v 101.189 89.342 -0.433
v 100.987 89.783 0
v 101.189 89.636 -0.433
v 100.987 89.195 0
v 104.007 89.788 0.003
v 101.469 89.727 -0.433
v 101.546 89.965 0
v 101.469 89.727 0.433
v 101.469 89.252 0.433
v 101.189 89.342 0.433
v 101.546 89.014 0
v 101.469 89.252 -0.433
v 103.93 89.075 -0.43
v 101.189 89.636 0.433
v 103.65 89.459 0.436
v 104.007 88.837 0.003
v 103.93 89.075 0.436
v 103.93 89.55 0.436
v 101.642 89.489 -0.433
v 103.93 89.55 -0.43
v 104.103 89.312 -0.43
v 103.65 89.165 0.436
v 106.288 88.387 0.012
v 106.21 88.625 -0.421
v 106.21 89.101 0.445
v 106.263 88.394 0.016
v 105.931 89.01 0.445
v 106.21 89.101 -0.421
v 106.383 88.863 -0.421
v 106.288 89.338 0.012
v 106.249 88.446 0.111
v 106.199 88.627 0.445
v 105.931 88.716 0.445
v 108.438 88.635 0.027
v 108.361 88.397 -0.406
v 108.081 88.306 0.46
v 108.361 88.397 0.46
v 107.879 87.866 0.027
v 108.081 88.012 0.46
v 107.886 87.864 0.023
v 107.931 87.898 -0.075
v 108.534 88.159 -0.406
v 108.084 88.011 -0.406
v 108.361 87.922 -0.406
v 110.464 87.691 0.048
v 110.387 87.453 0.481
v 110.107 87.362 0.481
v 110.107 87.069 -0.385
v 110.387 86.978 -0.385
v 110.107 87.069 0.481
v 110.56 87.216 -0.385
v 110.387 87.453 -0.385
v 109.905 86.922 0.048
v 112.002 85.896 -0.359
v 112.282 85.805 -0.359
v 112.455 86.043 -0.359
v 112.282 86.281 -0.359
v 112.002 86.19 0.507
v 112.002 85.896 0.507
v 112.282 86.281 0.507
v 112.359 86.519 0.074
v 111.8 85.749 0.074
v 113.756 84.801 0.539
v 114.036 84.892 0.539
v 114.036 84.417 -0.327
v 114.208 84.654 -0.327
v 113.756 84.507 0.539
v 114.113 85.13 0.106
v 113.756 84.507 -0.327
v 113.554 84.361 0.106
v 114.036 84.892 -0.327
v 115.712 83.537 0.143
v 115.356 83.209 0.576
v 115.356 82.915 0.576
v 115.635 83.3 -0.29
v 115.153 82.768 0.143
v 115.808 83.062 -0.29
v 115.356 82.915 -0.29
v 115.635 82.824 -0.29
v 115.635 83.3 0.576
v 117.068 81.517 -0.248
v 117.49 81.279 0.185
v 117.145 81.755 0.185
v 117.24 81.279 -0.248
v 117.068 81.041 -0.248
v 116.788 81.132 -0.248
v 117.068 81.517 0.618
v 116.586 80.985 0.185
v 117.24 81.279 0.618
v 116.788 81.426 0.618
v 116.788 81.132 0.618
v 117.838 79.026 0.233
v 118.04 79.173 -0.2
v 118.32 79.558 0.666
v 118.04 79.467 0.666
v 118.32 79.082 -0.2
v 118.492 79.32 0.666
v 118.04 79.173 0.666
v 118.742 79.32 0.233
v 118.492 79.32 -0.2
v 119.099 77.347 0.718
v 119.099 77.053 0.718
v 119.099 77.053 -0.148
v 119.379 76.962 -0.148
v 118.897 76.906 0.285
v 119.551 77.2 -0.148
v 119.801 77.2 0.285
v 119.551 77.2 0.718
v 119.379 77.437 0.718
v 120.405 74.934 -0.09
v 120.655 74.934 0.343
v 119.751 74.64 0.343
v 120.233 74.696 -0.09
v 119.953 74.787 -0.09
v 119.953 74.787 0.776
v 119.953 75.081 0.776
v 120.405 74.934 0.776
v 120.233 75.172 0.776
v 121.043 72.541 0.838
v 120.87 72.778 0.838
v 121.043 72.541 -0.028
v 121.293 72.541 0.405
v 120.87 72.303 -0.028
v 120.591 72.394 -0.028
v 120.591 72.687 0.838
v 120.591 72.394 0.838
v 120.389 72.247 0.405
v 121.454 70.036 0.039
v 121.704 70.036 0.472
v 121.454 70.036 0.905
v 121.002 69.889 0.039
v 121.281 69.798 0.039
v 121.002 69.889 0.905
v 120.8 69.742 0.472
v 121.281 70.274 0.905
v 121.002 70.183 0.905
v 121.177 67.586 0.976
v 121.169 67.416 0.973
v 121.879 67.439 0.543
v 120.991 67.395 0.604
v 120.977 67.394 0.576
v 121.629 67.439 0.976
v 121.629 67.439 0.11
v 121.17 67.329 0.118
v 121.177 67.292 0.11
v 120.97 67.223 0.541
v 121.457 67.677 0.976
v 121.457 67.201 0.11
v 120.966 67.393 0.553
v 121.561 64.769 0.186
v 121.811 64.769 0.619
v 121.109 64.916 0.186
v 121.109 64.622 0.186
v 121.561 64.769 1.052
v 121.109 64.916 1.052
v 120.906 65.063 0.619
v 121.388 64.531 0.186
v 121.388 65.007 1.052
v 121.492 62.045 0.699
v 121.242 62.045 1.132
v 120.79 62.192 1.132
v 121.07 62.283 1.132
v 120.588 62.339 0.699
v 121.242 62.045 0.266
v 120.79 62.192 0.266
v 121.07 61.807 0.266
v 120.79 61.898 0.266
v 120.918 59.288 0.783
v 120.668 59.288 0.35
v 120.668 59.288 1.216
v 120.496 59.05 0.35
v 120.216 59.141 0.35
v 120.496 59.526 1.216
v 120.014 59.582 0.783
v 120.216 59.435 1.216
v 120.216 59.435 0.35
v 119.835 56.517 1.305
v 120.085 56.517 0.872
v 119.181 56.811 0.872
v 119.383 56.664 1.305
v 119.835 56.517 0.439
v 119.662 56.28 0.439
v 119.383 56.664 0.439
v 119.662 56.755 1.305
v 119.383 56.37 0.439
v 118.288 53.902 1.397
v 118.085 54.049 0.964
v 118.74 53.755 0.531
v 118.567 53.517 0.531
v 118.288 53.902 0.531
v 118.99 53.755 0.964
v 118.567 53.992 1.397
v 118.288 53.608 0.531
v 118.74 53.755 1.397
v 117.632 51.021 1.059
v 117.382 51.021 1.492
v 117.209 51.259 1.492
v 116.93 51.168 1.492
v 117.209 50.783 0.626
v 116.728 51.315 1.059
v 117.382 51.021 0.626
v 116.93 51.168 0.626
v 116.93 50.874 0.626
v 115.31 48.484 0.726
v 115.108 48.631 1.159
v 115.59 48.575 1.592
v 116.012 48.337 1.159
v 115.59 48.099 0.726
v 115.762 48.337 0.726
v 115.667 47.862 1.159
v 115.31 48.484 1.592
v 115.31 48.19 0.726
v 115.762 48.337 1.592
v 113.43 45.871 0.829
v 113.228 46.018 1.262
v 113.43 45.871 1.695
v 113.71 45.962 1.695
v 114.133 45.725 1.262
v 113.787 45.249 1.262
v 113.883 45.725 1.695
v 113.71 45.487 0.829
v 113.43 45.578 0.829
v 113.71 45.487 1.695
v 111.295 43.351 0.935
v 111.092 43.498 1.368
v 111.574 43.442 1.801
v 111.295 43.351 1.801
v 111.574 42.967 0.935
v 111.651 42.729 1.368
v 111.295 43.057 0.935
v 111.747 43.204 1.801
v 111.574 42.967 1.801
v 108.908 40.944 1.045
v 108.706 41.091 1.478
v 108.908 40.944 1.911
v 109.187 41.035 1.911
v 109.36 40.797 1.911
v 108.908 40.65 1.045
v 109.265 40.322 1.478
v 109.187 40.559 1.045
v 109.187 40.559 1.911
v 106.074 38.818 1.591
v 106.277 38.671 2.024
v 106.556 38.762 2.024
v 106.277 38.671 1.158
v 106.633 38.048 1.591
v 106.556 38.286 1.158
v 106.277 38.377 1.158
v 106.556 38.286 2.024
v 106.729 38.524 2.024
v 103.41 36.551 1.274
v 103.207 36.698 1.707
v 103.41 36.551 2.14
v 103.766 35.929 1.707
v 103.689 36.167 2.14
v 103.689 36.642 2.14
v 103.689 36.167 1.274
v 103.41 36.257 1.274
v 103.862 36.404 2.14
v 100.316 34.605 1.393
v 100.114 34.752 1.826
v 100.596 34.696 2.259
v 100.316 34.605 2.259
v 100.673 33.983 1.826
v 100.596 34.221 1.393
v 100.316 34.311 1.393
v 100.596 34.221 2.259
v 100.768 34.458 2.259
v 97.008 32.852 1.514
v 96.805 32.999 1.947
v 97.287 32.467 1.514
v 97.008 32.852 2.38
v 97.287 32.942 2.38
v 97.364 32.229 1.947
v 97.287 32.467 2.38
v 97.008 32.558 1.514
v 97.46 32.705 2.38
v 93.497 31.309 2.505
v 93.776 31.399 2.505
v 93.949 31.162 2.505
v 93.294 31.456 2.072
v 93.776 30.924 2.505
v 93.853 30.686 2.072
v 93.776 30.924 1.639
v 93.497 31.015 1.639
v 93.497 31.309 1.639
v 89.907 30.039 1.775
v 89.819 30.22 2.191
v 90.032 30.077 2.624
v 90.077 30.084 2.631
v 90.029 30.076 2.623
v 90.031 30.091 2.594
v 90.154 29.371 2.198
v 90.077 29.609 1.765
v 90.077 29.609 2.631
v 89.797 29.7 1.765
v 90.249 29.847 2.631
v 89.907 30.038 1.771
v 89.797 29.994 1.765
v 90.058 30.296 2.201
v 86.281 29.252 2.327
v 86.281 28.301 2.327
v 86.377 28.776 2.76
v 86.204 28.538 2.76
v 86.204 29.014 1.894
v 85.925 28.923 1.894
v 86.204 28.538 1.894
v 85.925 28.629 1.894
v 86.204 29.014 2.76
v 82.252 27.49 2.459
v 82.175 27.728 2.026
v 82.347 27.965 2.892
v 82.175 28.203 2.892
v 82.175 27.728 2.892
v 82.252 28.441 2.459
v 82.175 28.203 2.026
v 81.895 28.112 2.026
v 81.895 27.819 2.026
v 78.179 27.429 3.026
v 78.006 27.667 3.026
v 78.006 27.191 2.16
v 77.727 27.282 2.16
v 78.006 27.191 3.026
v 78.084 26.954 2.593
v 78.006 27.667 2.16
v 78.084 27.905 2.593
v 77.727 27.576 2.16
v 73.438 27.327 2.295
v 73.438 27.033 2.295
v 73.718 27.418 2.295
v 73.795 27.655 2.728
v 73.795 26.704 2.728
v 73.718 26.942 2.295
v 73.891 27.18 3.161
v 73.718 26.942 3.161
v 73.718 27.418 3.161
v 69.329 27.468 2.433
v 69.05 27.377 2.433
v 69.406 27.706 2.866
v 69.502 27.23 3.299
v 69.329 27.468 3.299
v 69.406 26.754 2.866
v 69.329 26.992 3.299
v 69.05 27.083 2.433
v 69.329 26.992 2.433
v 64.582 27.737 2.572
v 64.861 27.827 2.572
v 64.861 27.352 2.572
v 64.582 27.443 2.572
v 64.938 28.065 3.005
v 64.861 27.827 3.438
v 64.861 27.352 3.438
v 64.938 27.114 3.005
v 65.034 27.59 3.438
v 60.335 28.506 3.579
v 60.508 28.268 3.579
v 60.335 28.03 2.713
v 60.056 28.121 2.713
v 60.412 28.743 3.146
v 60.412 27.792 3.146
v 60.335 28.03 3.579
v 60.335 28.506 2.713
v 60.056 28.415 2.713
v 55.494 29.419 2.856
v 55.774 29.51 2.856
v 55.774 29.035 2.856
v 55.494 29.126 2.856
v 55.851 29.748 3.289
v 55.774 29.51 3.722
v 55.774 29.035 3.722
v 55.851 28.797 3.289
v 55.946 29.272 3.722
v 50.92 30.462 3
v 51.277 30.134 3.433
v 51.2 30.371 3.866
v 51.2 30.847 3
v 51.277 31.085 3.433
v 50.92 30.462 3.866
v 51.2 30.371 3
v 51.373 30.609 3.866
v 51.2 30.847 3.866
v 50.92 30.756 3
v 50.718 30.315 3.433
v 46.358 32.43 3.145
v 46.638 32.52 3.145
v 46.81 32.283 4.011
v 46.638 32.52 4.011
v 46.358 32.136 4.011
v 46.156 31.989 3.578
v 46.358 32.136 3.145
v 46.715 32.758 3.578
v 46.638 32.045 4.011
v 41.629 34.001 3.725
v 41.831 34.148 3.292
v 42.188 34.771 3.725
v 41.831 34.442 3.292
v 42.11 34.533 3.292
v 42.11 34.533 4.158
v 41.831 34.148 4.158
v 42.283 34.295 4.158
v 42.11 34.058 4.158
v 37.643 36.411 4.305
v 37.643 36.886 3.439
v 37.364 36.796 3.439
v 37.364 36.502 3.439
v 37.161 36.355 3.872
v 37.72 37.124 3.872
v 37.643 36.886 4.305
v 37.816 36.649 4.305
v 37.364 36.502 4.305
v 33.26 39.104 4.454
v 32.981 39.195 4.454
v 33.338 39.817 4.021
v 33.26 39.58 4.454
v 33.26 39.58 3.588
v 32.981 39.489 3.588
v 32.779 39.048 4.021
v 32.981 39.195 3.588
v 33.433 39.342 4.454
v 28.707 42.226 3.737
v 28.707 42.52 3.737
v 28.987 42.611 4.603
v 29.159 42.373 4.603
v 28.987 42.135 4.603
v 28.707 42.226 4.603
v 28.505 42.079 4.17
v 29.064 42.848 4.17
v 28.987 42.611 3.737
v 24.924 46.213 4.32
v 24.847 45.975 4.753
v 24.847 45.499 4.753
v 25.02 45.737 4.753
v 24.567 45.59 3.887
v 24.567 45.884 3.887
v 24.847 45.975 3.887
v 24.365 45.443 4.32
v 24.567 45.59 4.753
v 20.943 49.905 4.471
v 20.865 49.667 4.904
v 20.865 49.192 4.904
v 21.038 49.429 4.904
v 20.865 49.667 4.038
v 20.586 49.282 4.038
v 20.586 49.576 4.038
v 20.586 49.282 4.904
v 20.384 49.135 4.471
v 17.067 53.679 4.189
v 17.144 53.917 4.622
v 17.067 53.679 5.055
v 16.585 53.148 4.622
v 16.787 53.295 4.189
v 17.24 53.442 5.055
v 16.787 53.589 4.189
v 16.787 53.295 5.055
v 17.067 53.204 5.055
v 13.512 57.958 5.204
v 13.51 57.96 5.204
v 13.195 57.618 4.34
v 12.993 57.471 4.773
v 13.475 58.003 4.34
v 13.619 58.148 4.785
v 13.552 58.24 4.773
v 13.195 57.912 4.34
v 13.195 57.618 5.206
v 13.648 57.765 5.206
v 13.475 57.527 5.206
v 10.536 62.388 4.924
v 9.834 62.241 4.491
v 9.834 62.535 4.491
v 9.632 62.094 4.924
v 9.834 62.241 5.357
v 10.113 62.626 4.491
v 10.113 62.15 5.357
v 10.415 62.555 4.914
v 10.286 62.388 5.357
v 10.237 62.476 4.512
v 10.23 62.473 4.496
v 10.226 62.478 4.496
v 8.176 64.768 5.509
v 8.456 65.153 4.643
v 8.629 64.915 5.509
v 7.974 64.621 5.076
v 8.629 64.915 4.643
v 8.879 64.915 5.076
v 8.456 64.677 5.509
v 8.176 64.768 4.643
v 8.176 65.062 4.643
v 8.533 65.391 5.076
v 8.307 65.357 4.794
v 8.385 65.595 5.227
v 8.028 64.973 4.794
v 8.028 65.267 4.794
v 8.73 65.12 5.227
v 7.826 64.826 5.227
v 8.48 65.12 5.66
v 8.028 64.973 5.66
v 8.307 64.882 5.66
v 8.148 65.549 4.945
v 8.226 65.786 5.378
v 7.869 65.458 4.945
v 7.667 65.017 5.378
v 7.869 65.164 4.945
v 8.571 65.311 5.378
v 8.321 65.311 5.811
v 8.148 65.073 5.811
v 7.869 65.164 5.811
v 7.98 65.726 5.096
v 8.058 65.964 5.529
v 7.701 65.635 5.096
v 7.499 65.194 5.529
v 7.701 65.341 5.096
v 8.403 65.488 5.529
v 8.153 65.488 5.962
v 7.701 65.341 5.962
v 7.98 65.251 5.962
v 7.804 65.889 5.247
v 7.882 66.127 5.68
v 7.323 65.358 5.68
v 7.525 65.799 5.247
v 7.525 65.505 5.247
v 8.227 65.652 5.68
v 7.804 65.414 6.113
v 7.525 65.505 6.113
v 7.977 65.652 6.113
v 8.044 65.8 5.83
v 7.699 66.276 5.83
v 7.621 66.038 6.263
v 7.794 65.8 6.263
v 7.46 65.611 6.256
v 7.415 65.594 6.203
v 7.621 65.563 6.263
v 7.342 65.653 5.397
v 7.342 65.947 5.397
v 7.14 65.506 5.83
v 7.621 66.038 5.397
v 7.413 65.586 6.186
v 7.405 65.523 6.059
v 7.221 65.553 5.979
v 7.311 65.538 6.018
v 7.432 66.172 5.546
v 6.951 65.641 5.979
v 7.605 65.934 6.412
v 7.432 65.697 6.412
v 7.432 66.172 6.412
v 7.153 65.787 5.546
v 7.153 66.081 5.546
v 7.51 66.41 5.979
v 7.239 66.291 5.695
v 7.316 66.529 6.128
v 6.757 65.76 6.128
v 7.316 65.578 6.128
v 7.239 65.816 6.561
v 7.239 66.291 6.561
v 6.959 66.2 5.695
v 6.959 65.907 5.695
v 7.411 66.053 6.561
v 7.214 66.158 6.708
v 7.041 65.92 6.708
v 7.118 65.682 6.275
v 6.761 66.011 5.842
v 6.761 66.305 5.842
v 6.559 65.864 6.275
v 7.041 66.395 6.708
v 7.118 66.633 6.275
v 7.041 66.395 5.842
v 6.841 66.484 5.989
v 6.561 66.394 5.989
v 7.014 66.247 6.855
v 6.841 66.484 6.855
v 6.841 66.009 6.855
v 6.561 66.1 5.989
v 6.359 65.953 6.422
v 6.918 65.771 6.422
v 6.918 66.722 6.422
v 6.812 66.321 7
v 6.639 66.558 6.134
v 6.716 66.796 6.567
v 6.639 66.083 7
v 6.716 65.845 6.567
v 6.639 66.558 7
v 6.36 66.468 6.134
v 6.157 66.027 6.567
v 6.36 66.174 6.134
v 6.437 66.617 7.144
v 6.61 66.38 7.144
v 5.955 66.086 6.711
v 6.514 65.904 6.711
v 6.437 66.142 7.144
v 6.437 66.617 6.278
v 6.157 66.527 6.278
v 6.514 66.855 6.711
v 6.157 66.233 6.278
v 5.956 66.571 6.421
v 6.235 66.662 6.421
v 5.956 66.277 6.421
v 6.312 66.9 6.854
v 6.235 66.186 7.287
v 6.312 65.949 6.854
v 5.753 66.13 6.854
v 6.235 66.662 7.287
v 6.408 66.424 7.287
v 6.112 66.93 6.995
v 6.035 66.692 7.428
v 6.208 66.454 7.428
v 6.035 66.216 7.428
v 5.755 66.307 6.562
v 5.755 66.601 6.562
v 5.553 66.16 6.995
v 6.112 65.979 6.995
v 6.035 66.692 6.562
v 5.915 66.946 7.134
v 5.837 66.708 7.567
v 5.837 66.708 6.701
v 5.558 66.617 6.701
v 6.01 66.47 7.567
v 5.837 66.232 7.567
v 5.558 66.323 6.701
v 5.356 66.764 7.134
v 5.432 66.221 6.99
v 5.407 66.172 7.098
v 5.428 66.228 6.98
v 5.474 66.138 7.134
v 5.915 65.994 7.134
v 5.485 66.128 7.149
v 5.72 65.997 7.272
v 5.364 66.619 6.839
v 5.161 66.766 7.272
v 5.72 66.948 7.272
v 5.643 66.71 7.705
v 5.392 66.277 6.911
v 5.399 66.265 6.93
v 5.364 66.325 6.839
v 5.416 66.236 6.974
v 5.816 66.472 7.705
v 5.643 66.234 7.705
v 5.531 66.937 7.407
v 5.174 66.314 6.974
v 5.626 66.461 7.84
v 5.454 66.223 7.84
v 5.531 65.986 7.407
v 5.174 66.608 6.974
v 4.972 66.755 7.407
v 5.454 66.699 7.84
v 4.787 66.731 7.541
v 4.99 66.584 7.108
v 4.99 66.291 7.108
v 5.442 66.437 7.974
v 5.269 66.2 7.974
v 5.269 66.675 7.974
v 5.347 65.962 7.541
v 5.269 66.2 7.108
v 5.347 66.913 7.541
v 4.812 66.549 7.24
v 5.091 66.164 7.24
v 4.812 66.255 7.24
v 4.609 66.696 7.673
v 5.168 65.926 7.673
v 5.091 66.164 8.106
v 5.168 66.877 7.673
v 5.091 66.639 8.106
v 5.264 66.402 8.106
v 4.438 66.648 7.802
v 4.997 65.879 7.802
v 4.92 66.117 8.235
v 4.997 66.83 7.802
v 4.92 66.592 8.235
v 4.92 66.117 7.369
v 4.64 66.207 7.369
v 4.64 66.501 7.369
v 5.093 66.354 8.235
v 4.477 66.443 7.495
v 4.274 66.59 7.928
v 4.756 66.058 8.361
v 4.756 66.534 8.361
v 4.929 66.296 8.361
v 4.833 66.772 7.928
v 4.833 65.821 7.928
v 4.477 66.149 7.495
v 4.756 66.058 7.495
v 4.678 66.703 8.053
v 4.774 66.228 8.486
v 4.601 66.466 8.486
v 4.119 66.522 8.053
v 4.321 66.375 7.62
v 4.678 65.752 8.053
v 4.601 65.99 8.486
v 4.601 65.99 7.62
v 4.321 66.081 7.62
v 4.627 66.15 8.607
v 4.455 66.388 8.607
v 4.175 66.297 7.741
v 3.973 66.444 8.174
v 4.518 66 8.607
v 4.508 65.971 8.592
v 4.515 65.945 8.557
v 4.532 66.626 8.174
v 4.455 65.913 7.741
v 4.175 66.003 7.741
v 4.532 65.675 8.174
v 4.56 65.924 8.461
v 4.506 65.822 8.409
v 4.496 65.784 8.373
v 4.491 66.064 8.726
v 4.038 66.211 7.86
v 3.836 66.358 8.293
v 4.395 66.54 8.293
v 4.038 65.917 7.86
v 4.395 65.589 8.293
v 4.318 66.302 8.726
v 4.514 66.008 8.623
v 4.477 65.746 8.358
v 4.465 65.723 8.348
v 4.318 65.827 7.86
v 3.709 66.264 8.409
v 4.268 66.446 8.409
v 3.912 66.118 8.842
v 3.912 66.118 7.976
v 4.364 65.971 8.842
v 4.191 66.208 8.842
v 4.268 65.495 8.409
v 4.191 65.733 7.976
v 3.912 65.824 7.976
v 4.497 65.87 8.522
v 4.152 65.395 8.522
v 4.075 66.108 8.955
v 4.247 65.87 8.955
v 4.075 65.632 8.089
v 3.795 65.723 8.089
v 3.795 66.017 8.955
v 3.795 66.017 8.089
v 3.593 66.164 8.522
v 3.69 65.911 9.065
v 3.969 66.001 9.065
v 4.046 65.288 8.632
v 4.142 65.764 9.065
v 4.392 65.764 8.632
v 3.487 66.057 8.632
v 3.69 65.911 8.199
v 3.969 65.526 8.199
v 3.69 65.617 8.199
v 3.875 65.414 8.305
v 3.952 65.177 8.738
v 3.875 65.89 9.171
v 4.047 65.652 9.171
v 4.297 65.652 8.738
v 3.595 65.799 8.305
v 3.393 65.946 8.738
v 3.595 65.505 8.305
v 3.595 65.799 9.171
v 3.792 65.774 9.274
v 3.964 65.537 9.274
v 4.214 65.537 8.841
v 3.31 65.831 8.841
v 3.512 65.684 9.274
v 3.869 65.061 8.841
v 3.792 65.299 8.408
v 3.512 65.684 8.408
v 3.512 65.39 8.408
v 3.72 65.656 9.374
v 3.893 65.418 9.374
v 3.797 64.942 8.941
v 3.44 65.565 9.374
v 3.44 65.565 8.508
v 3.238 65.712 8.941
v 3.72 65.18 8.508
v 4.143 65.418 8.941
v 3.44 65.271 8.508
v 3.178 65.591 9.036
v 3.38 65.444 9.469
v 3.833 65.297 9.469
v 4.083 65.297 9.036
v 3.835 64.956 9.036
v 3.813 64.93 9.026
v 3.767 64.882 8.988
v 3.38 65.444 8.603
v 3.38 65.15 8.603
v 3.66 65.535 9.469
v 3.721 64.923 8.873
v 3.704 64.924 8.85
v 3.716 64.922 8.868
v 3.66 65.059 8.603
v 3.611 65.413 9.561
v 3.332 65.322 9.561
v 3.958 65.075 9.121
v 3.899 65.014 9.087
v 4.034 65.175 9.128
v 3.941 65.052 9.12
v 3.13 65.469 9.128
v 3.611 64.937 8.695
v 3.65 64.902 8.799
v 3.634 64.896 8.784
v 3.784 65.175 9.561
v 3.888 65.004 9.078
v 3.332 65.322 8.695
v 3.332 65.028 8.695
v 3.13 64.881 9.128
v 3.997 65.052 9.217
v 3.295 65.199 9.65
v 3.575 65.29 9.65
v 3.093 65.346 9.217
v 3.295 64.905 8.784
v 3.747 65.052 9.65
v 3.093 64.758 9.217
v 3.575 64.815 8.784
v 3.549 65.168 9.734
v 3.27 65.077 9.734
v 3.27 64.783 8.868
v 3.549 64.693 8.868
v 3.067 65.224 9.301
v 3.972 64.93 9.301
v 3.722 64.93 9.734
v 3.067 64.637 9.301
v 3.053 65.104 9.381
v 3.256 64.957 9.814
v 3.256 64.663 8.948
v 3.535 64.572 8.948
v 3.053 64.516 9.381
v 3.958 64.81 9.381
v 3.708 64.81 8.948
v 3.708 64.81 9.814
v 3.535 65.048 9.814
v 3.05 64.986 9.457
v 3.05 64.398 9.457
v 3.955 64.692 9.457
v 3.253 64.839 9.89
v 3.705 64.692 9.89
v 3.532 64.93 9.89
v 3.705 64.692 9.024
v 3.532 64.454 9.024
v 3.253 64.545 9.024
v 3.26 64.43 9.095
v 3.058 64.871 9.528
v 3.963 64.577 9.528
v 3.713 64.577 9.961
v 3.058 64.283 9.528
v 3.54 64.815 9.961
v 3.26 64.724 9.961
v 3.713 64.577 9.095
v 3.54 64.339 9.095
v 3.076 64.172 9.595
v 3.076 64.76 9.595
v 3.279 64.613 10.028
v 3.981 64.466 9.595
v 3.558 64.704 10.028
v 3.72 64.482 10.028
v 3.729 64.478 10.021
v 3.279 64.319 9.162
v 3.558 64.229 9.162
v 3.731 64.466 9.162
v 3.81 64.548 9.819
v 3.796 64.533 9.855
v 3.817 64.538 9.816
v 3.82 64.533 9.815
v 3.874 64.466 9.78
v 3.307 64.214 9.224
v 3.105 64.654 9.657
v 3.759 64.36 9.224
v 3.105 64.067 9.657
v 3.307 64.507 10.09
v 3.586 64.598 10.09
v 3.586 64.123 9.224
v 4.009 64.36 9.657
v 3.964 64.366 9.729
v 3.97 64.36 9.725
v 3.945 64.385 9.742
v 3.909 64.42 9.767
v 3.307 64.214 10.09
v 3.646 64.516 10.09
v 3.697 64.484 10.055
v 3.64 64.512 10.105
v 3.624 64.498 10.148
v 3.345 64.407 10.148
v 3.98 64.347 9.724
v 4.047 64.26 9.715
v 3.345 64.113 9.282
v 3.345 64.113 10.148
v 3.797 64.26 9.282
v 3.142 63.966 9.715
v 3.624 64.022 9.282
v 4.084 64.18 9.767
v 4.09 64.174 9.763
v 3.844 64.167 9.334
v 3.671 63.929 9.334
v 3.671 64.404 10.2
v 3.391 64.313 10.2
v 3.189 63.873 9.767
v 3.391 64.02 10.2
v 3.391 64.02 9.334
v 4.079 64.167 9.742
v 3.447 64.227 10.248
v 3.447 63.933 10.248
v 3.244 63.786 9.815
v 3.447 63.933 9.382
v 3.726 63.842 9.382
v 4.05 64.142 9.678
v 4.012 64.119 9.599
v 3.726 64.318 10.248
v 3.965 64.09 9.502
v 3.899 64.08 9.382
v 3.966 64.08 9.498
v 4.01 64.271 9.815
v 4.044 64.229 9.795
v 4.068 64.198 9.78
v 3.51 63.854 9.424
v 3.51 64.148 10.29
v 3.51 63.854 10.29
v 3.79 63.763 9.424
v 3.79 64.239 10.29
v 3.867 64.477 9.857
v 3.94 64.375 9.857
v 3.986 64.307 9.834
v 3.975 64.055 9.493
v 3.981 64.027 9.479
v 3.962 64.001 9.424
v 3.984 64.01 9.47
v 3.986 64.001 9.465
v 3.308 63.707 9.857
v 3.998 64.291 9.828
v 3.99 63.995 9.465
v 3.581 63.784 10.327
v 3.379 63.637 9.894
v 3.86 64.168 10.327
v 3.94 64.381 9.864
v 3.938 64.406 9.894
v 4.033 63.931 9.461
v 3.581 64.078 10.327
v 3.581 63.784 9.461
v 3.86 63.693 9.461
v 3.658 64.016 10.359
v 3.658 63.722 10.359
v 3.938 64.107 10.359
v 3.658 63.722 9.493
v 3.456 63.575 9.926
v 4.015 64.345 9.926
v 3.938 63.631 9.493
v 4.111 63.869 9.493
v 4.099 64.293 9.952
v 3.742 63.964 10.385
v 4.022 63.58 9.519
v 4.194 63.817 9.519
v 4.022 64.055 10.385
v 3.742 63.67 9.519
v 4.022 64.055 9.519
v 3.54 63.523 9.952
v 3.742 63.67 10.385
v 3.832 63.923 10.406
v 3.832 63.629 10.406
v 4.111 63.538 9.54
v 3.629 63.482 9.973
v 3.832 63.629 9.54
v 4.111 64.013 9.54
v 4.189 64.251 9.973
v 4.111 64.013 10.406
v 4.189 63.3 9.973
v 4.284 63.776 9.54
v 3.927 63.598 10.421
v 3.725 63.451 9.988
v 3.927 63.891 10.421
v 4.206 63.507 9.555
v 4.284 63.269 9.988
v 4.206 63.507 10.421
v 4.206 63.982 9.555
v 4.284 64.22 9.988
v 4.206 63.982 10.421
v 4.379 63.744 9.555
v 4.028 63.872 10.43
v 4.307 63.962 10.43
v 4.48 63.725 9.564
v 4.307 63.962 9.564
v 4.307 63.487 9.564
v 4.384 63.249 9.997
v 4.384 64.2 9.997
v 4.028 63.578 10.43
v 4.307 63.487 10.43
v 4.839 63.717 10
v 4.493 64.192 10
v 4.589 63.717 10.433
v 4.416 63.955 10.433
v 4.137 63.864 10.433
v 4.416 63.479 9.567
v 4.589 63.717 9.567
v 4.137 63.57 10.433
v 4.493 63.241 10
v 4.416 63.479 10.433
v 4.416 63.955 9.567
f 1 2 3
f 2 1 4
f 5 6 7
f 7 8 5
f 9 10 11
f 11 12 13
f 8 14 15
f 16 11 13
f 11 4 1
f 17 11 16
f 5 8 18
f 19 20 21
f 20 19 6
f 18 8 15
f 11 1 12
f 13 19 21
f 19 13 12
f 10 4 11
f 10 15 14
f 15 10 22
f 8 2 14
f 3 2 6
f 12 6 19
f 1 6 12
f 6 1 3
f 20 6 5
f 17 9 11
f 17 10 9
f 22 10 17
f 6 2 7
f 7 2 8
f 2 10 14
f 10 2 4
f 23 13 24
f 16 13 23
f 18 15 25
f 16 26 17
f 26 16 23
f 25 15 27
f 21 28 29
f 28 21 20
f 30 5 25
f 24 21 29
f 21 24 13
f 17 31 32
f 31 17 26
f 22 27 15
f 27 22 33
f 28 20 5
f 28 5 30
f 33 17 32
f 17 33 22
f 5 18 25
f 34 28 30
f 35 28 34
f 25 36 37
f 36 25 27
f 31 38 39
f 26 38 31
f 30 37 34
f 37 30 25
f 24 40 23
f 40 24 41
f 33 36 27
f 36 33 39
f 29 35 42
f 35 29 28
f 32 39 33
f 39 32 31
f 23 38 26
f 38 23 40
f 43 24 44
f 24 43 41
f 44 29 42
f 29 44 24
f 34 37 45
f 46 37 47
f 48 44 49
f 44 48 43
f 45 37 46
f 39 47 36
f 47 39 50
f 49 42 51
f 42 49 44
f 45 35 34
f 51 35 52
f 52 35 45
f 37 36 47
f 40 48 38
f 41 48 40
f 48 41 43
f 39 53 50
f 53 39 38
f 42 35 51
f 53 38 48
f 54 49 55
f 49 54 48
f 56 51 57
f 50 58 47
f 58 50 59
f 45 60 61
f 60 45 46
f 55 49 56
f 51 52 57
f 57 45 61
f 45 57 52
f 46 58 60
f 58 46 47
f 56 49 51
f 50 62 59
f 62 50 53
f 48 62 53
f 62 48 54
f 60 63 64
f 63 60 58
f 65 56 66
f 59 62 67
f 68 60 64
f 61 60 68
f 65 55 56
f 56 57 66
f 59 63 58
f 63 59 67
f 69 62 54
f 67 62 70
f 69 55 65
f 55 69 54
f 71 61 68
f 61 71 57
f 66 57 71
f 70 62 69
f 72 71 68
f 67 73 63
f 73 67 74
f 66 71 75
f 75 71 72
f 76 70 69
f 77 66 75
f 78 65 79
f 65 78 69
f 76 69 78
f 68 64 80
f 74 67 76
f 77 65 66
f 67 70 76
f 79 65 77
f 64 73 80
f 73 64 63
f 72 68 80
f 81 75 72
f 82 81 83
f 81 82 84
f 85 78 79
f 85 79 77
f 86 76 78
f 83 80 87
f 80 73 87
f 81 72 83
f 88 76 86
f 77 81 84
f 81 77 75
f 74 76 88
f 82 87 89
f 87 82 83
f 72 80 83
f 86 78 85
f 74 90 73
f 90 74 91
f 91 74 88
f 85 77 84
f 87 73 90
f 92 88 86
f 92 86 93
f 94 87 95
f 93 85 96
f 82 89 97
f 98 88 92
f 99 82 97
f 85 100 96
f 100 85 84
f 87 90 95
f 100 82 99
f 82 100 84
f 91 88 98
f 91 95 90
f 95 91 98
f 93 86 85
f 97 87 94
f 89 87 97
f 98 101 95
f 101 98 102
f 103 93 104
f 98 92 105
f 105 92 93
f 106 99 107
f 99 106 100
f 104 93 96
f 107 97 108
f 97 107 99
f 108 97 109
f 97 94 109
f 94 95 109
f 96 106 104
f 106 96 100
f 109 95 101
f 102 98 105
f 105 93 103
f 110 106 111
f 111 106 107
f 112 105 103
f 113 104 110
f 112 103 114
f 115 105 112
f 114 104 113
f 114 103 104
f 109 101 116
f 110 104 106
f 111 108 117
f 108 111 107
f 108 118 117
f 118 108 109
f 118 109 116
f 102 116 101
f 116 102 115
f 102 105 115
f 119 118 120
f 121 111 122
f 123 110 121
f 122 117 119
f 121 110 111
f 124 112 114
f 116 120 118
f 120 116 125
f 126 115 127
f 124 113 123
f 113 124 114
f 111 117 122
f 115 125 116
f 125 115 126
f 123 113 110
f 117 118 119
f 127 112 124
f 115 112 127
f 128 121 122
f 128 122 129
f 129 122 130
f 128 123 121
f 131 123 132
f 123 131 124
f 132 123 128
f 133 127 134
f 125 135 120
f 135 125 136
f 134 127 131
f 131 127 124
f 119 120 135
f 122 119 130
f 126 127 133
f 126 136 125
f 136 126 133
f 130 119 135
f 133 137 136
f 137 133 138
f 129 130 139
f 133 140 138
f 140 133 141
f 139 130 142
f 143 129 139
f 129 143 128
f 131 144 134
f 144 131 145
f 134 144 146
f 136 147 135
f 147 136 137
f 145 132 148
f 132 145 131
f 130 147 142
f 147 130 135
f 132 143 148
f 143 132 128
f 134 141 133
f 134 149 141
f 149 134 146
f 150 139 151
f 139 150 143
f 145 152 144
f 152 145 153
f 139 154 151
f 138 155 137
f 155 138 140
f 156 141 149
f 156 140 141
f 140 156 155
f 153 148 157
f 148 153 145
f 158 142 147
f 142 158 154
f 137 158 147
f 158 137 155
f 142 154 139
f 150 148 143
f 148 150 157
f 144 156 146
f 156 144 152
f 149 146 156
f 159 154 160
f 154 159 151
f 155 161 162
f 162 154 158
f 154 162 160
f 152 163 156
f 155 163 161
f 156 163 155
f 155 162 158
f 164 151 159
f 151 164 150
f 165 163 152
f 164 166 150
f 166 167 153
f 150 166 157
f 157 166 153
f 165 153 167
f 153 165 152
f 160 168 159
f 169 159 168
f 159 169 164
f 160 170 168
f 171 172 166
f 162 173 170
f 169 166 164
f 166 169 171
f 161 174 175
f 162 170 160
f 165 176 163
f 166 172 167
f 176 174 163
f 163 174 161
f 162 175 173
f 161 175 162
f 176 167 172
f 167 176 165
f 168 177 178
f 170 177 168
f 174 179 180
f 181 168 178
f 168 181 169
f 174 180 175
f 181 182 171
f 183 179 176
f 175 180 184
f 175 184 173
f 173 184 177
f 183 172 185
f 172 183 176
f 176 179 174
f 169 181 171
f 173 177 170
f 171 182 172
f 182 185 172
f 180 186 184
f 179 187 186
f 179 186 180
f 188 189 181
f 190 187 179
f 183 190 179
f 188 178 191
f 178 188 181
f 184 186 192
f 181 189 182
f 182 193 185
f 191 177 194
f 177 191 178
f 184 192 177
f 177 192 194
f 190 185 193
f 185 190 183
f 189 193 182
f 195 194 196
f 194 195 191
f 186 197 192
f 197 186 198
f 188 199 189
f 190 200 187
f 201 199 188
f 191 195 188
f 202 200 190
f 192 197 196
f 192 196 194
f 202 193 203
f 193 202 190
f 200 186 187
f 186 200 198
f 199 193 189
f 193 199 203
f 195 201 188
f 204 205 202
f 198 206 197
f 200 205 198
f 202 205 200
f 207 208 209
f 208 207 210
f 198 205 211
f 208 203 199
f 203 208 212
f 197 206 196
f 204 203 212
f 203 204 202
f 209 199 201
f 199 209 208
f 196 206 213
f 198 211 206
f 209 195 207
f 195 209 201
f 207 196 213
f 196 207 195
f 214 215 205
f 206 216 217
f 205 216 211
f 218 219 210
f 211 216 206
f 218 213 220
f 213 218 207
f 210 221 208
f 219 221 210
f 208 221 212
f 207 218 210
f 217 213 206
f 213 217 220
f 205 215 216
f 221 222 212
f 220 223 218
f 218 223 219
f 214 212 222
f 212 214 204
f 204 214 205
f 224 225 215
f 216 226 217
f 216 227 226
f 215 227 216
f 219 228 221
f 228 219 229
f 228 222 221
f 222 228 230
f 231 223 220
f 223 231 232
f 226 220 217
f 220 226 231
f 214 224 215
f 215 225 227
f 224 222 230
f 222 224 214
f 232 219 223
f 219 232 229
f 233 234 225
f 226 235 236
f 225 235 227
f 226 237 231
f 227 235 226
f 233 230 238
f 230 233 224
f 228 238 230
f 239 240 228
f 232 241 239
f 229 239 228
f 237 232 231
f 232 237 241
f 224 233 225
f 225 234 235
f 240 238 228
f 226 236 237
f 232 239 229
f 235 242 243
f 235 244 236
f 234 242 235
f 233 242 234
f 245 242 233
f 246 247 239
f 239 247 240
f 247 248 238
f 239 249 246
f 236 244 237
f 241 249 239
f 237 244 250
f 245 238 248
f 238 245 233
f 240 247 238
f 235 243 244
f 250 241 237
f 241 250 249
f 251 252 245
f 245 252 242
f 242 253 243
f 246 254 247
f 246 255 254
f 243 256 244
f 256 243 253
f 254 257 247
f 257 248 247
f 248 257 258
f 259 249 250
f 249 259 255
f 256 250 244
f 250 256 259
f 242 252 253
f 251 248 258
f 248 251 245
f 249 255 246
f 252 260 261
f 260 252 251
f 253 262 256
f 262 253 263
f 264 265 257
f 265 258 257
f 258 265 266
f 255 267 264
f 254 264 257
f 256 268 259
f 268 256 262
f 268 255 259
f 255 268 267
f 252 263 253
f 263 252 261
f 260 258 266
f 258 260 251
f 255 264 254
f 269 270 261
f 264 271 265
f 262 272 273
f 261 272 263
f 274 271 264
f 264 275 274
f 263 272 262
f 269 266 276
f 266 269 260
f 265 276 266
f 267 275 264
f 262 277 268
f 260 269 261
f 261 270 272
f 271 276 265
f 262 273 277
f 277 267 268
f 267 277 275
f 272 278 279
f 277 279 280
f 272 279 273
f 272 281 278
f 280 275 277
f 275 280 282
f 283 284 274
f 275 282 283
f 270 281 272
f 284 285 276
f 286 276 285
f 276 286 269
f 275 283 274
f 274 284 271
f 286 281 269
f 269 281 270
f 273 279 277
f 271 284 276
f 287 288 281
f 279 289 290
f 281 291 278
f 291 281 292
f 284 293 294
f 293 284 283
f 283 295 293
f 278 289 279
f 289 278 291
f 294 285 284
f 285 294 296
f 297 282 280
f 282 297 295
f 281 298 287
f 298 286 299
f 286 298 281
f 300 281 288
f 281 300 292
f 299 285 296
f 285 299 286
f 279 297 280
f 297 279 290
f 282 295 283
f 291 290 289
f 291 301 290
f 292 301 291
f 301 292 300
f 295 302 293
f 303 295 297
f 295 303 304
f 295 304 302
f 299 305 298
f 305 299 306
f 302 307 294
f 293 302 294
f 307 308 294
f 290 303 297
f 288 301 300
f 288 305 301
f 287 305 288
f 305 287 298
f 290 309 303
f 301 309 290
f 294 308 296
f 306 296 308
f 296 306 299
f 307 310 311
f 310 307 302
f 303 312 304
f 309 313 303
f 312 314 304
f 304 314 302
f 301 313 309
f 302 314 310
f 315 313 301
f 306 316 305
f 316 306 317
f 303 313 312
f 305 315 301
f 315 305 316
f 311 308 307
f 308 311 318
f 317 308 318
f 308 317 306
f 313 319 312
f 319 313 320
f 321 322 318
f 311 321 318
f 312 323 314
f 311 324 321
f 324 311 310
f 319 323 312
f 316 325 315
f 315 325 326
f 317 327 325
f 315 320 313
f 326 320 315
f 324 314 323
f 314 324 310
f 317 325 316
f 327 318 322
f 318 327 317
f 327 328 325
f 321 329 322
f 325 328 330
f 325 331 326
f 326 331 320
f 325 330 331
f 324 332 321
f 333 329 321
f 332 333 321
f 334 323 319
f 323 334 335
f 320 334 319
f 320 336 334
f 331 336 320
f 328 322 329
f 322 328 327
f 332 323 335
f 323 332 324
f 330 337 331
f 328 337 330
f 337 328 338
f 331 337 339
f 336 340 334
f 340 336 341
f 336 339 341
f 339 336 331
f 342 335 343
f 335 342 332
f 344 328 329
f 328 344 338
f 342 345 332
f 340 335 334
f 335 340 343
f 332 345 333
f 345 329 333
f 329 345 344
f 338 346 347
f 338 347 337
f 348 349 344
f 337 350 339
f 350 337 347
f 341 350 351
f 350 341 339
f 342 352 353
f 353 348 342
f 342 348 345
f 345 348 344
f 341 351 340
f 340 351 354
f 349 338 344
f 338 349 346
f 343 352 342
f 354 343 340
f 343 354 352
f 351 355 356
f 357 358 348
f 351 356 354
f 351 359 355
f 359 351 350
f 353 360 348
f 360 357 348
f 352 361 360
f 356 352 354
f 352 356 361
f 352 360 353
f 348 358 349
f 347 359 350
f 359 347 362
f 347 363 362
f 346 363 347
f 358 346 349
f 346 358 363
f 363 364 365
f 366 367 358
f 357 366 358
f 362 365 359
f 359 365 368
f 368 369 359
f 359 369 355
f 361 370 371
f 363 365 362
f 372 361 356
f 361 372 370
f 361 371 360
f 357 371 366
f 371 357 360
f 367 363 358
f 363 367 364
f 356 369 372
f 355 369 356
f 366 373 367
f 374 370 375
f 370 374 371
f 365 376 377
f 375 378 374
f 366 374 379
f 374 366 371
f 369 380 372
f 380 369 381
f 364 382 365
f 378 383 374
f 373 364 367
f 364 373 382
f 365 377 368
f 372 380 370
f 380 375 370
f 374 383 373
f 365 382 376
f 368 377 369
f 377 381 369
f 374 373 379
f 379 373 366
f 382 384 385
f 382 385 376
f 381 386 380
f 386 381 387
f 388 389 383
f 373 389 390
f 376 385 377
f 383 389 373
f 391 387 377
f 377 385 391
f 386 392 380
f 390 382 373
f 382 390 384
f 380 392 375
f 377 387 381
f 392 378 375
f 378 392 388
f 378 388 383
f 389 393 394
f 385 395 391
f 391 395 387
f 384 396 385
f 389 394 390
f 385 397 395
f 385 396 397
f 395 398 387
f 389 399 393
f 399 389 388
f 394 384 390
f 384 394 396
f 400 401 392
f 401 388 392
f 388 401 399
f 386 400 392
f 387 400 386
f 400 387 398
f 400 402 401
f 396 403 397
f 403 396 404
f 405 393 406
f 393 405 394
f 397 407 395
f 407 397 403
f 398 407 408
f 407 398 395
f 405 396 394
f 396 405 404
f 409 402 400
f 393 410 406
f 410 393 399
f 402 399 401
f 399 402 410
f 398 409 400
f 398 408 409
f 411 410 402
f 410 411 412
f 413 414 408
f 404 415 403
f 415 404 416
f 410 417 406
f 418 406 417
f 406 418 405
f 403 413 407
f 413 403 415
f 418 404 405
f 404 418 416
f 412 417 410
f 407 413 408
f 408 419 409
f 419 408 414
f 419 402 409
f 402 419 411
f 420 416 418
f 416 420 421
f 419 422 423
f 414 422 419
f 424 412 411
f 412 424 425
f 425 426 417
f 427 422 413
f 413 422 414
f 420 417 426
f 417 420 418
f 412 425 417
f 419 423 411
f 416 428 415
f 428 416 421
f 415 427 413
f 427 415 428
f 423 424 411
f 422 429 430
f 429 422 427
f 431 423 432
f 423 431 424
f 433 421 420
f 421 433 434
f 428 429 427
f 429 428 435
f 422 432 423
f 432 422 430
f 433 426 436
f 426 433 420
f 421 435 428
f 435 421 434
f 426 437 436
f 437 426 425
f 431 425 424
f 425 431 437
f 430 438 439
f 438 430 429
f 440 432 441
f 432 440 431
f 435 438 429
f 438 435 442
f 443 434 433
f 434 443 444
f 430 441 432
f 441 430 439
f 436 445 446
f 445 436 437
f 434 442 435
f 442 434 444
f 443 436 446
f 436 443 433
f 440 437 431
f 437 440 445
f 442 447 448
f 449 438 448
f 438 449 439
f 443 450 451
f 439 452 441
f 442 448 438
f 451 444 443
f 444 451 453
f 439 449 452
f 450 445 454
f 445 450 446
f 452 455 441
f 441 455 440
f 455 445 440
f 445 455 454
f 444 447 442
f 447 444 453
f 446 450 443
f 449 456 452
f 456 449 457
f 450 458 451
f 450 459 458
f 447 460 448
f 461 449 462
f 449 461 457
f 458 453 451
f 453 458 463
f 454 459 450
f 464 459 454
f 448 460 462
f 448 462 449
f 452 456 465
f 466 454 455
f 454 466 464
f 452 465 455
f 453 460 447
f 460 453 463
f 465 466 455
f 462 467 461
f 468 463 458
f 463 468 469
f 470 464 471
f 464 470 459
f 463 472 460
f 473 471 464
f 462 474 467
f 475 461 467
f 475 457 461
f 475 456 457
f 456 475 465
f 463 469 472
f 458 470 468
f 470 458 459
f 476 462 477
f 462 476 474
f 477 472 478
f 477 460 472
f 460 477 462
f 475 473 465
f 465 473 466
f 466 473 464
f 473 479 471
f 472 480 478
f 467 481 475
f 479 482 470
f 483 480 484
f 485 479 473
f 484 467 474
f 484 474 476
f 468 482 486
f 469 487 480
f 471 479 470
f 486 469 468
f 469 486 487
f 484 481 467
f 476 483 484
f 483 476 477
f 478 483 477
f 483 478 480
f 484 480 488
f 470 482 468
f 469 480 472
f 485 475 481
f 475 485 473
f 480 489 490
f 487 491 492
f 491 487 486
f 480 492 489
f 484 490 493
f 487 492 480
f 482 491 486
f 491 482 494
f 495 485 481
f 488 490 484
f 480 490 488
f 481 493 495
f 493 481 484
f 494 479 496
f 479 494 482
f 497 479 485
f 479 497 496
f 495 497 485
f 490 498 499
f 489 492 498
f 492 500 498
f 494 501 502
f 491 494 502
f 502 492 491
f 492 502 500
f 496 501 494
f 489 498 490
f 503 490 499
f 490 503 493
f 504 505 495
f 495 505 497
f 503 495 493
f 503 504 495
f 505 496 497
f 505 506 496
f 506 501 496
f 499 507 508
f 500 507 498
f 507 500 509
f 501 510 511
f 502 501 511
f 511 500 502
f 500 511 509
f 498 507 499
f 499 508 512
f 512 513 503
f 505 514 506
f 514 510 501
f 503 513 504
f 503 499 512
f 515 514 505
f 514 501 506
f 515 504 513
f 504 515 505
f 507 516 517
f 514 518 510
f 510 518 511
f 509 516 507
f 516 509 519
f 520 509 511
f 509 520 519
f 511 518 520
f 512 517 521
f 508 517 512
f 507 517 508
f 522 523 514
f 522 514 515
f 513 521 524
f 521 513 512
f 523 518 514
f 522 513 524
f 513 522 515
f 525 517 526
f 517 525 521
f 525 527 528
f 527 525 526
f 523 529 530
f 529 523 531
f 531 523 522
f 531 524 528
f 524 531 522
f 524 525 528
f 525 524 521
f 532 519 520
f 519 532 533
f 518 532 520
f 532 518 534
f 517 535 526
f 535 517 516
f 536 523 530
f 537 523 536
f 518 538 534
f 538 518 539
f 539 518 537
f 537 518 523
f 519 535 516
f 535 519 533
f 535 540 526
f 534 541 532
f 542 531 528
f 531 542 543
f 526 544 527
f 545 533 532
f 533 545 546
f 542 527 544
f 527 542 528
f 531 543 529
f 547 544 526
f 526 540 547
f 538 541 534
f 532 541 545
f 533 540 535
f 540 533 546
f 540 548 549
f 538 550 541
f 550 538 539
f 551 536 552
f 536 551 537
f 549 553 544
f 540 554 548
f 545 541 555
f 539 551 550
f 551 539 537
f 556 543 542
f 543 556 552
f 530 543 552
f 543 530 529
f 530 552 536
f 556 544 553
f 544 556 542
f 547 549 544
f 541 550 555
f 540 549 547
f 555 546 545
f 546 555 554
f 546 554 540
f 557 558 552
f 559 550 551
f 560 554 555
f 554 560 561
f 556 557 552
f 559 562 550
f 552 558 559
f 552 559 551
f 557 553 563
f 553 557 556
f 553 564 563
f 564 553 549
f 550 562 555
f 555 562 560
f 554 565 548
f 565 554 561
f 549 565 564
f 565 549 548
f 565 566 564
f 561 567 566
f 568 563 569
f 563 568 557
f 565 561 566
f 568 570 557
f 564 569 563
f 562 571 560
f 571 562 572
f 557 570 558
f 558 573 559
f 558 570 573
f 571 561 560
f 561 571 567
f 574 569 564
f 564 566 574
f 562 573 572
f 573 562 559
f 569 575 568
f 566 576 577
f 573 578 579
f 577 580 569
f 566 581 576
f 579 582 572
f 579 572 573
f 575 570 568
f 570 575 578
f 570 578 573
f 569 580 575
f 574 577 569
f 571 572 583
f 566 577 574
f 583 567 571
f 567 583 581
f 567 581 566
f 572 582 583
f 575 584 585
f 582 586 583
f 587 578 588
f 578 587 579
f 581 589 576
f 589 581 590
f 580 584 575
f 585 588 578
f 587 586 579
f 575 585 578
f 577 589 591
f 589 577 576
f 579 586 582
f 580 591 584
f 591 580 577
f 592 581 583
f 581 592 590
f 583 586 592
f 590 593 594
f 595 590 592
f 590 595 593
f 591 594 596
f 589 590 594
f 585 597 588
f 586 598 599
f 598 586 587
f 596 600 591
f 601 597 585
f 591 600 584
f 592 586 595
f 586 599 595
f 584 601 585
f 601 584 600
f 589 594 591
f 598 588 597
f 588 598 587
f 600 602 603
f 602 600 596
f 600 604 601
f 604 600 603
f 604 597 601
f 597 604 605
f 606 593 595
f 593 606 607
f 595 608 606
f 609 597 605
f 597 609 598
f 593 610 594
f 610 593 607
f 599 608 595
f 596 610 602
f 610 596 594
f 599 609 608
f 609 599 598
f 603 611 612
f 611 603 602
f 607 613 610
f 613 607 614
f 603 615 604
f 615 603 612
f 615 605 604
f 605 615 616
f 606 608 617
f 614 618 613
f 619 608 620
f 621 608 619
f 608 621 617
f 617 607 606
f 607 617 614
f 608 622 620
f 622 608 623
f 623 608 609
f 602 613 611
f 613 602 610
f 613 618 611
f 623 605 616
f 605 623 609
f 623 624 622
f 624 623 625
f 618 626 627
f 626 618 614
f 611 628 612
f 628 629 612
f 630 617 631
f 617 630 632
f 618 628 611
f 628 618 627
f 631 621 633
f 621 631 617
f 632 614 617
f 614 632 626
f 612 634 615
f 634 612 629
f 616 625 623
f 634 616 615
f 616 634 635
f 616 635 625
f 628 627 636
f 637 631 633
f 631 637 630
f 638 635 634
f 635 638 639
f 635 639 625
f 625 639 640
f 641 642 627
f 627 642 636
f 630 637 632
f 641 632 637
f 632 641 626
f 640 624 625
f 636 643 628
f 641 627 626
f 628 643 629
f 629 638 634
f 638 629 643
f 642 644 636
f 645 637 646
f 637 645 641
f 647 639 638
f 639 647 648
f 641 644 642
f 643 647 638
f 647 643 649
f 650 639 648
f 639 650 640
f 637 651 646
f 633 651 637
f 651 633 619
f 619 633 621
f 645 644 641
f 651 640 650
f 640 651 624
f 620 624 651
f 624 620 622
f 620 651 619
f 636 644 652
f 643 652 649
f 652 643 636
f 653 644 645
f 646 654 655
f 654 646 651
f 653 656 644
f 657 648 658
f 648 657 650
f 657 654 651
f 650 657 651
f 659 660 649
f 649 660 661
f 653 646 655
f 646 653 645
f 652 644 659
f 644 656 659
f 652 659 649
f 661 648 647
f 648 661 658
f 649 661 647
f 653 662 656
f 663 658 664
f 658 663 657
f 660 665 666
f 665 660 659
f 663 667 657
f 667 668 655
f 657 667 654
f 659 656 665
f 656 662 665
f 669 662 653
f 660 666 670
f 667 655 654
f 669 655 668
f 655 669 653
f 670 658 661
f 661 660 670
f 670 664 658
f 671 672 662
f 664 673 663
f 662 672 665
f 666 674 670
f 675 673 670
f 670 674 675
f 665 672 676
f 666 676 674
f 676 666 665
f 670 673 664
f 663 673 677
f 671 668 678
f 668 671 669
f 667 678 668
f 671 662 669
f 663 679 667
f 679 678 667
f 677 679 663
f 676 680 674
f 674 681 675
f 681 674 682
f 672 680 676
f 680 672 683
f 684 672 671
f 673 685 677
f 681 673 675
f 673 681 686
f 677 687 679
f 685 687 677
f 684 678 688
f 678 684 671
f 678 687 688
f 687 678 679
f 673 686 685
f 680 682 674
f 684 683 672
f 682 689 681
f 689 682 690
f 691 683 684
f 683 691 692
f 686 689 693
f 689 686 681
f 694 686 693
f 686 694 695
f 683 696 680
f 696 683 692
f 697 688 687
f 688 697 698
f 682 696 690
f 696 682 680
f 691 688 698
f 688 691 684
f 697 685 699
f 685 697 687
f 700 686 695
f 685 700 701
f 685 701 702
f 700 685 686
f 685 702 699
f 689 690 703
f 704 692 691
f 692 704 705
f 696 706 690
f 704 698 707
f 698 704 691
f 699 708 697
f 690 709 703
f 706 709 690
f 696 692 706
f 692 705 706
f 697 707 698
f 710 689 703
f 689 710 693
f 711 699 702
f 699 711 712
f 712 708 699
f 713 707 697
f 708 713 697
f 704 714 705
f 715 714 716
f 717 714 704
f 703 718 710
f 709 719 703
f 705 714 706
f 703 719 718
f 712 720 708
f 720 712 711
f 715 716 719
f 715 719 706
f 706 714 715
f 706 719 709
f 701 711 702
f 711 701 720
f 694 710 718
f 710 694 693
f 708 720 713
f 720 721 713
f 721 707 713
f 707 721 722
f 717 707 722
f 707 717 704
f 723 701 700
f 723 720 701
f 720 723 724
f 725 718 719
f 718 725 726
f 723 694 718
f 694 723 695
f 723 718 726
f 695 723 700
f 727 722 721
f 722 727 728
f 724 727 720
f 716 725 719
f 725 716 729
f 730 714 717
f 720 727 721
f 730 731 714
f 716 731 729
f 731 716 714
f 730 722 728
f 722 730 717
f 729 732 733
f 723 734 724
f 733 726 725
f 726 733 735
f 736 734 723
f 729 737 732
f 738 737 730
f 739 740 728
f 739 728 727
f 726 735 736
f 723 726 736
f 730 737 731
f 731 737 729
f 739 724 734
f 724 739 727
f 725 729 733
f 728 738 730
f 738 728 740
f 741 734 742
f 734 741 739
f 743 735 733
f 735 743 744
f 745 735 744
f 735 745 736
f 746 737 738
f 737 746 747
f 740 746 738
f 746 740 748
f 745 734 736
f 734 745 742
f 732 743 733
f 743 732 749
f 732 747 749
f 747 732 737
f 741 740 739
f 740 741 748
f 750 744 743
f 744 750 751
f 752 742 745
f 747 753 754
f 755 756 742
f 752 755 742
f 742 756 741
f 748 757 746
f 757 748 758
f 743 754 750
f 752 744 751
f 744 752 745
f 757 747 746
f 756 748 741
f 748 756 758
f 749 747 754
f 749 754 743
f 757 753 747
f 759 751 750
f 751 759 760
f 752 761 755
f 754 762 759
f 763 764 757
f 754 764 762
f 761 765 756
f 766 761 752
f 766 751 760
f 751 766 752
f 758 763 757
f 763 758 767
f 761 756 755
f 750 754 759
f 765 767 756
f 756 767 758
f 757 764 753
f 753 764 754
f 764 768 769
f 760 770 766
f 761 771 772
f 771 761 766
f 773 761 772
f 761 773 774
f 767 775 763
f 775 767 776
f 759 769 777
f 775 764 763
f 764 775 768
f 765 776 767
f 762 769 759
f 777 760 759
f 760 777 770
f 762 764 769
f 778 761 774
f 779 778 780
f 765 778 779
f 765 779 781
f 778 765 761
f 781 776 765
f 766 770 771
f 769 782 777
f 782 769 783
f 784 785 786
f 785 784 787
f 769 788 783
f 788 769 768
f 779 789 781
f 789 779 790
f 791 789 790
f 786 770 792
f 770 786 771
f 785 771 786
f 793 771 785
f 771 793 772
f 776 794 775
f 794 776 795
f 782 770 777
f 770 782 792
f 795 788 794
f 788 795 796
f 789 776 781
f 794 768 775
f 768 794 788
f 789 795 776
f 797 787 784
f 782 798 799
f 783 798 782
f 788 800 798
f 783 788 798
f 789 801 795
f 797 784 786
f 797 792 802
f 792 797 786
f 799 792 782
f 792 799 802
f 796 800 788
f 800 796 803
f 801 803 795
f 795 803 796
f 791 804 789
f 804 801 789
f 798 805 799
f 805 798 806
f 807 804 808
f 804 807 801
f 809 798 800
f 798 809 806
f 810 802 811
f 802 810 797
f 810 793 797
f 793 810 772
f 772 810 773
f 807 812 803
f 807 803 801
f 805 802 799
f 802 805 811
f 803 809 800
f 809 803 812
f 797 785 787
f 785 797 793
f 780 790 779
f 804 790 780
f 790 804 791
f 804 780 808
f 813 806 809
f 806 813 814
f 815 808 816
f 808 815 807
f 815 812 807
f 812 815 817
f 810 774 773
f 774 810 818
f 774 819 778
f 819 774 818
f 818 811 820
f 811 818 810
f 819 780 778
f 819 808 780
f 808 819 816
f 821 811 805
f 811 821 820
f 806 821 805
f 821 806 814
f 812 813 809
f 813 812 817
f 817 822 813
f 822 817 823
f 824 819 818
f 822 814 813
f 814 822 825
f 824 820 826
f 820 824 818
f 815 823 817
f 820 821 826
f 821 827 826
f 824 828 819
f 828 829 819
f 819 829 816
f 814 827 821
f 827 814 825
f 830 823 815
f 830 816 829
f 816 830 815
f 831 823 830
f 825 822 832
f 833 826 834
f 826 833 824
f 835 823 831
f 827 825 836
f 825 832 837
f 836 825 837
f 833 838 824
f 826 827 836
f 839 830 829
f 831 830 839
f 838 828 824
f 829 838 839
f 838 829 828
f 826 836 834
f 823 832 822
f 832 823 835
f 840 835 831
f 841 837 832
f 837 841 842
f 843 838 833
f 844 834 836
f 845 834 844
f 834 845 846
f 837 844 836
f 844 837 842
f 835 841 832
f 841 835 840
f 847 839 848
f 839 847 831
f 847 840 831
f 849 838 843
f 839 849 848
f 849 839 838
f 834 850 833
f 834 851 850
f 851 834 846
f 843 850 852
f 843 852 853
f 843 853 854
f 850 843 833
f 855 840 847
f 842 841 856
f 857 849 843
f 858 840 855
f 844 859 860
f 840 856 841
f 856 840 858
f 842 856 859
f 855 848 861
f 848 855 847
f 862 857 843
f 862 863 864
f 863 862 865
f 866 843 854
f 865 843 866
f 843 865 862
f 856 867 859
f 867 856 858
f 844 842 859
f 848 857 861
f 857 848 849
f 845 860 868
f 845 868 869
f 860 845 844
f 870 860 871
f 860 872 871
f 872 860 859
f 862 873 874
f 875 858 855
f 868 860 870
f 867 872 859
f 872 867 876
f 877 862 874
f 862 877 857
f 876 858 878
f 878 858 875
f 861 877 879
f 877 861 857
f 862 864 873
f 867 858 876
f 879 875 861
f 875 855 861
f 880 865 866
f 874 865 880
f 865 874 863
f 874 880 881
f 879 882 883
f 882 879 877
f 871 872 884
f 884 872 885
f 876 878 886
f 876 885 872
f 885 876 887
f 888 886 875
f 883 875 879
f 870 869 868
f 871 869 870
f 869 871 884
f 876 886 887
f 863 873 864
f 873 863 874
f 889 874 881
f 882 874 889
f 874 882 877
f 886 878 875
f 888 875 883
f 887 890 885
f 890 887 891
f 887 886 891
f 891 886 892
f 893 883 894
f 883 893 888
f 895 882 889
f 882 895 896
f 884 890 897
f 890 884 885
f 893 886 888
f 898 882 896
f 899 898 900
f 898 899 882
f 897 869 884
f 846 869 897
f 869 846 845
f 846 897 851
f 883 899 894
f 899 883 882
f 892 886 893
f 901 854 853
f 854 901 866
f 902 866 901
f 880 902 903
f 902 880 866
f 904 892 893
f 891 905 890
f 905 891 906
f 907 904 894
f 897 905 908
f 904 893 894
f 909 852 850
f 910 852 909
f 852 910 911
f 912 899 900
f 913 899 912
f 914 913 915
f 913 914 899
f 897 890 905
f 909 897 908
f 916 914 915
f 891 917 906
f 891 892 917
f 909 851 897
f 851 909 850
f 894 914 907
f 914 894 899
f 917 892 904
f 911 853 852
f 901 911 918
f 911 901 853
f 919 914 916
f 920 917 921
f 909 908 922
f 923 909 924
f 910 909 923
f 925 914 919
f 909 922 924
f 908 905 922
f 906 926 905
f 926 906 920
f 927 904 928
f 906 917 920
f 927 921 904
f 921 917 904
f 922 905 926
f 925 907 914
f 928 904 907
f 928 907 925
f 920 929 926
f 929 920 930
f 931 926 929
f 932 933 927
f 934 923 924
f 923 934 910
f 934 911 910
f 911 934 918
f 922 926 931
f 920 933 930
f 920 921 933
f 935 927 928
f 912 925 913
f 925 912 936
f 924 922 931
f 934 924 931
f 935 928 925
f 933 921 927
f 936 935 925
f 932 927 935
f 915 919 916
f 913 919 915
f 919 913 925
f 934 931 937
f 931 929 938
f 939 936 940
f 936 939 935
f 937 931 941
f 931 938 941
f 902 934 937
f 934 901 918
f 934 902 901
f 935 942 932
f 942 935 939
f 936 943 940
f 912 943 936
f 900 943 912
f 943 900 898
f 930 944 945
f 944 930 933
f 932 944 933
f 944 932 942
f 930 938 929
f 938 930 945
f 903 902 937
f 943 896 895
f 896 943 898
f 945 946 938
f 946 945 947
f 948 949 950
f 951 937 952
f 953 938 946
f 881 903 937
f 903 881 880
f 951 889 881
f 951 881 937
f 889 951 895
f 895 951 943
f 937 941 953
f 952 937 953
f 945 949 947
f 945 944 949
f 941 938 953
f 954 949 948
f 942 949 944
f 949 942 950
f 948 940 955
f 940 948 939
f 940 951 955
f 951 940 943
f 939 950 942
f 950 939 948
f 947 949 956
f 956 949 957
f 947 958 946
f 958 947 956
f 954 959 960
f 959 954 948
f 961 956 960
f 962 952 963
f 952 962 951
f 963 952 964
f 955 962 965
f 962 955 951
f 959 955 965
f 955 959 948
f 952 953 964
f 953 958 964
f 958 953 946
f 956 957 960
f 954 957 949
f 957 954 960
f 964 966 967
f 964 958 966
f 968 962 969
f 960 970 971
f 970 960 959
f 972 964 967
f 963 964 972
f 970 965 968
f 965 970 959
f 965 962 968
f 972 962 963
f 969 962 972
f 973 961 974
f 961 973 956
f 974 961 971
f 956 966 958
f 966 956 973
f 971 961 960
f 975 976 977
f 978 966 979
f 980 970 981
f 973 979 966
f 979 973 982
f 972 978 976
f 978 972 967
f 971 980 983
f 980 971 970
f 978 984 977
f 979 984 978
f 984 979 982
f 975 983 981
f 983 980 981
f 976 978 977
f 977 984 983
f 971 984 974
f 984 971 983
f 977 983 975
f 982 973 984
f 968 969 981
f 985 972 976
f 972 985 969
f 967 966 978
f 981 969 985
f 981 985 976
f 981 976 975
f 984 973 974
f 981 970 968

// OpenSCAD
 polyline(D_Apiral_As_Line([rnd(100),rnd(100)],[rnd(100),rnd(100)],turns=rnd(3),exponent=rnd(-1,2),steps= 50,bias=rnd(1.3)-0.1));

module polyline(p) {for(i=[0:max(0,len(p)-2)])line(p[i],p[i+1]);}

module polyplot(p) {for(i=[0:max(0,len(p)-1)])translate(p[i])sphere(1);}

module line(p1, p2 ,width=0.5) { hull() {        
translate(p1) sphere(width,$fn=5);
translate(p2) sphere(width,$fn=5); } }

function L_Spiral (radius = 50,turns =  4,exponent=1.685,start_angle=45,
steps=50,p1,p2)
=  [for(a = [0.5/steps:1/steps: 1  ])[ 
(radius * fx2(1-a, exponent)) * cos(start_angle+ a* turns*360*sign(turns)),
(radius * fx2(1-a, exponent)) * sin(start_angle+a* turns*360*sign(turns) )]+p1 ];

function D_Apiral_As_Line(p1,p2,turns=3,exponent=1.685 ,steps=150,bias=0.392)=


let(p3=lerp(p1,p2,bias) ,
spiral2d=
concat(
reverse(L_Spiral (radius=norm(p1-p3),turns =turns,exponent=exponent,start_angle=atan2((p3-p1).y,(p3-p1).x),steps=steps,p1=p1,p2=p3)),
(L_Spiral (radius=norm(p2-p3),turns =turns,exponent=exponent,start_angle=atan2((p3-p2).y,(p3-p2).x),steps=steps,p1=p2,p2=p3)    ))
)

[for (i=[0:len(spiral2d)-1],j=i/(len(spiral2d)-1))[spiral2d[i].x,spiral2d[i].y,lerp(0,10,  ( smStep(j)))]];


    function smStep (a) =
let (b = clamp(a))(b * b * (3 - 2 * b));
 
function clamp(a, b = 0, c = 1) =is_list(a)? [for (i=a)clamp(i,b,c)] : min(max(a, b), c);

function gauss(x) =  
     x + (x - smStep(x));


function L_Apiral_As_Line(p1,p2,turns=3,exponent=1.685 ,steps=150)=
L_Spiral (radius=norm(p1-p2),turns =turns,exponent=exponent,start_angle=atan2((p2-p1).y,(p2-p1).x),steps=steps,p1=p1,p2=p2);

function fx2(x,n) = n<0?pow(max(0,x),1/abs(min(-1,n-1) )):pow(max(0,x),max(1,n+1))   ;
function reverse(l) = len(l)>0 ? 
[ for(i=[len(l)-1:-1:0]) l[i] ] : len(l)==0 ? [] : undef; 
function lerp(start, end, bias) = (end * bias + start * (1 - bias));
function rnd(a = 1, b = 0, s = []) = 
s == [] ? 
(rands(min(a, b), max(   a, b), 1)[0]) 
: 
(rands(min(a, b), max(a, b), 1, s)[0])
; 
